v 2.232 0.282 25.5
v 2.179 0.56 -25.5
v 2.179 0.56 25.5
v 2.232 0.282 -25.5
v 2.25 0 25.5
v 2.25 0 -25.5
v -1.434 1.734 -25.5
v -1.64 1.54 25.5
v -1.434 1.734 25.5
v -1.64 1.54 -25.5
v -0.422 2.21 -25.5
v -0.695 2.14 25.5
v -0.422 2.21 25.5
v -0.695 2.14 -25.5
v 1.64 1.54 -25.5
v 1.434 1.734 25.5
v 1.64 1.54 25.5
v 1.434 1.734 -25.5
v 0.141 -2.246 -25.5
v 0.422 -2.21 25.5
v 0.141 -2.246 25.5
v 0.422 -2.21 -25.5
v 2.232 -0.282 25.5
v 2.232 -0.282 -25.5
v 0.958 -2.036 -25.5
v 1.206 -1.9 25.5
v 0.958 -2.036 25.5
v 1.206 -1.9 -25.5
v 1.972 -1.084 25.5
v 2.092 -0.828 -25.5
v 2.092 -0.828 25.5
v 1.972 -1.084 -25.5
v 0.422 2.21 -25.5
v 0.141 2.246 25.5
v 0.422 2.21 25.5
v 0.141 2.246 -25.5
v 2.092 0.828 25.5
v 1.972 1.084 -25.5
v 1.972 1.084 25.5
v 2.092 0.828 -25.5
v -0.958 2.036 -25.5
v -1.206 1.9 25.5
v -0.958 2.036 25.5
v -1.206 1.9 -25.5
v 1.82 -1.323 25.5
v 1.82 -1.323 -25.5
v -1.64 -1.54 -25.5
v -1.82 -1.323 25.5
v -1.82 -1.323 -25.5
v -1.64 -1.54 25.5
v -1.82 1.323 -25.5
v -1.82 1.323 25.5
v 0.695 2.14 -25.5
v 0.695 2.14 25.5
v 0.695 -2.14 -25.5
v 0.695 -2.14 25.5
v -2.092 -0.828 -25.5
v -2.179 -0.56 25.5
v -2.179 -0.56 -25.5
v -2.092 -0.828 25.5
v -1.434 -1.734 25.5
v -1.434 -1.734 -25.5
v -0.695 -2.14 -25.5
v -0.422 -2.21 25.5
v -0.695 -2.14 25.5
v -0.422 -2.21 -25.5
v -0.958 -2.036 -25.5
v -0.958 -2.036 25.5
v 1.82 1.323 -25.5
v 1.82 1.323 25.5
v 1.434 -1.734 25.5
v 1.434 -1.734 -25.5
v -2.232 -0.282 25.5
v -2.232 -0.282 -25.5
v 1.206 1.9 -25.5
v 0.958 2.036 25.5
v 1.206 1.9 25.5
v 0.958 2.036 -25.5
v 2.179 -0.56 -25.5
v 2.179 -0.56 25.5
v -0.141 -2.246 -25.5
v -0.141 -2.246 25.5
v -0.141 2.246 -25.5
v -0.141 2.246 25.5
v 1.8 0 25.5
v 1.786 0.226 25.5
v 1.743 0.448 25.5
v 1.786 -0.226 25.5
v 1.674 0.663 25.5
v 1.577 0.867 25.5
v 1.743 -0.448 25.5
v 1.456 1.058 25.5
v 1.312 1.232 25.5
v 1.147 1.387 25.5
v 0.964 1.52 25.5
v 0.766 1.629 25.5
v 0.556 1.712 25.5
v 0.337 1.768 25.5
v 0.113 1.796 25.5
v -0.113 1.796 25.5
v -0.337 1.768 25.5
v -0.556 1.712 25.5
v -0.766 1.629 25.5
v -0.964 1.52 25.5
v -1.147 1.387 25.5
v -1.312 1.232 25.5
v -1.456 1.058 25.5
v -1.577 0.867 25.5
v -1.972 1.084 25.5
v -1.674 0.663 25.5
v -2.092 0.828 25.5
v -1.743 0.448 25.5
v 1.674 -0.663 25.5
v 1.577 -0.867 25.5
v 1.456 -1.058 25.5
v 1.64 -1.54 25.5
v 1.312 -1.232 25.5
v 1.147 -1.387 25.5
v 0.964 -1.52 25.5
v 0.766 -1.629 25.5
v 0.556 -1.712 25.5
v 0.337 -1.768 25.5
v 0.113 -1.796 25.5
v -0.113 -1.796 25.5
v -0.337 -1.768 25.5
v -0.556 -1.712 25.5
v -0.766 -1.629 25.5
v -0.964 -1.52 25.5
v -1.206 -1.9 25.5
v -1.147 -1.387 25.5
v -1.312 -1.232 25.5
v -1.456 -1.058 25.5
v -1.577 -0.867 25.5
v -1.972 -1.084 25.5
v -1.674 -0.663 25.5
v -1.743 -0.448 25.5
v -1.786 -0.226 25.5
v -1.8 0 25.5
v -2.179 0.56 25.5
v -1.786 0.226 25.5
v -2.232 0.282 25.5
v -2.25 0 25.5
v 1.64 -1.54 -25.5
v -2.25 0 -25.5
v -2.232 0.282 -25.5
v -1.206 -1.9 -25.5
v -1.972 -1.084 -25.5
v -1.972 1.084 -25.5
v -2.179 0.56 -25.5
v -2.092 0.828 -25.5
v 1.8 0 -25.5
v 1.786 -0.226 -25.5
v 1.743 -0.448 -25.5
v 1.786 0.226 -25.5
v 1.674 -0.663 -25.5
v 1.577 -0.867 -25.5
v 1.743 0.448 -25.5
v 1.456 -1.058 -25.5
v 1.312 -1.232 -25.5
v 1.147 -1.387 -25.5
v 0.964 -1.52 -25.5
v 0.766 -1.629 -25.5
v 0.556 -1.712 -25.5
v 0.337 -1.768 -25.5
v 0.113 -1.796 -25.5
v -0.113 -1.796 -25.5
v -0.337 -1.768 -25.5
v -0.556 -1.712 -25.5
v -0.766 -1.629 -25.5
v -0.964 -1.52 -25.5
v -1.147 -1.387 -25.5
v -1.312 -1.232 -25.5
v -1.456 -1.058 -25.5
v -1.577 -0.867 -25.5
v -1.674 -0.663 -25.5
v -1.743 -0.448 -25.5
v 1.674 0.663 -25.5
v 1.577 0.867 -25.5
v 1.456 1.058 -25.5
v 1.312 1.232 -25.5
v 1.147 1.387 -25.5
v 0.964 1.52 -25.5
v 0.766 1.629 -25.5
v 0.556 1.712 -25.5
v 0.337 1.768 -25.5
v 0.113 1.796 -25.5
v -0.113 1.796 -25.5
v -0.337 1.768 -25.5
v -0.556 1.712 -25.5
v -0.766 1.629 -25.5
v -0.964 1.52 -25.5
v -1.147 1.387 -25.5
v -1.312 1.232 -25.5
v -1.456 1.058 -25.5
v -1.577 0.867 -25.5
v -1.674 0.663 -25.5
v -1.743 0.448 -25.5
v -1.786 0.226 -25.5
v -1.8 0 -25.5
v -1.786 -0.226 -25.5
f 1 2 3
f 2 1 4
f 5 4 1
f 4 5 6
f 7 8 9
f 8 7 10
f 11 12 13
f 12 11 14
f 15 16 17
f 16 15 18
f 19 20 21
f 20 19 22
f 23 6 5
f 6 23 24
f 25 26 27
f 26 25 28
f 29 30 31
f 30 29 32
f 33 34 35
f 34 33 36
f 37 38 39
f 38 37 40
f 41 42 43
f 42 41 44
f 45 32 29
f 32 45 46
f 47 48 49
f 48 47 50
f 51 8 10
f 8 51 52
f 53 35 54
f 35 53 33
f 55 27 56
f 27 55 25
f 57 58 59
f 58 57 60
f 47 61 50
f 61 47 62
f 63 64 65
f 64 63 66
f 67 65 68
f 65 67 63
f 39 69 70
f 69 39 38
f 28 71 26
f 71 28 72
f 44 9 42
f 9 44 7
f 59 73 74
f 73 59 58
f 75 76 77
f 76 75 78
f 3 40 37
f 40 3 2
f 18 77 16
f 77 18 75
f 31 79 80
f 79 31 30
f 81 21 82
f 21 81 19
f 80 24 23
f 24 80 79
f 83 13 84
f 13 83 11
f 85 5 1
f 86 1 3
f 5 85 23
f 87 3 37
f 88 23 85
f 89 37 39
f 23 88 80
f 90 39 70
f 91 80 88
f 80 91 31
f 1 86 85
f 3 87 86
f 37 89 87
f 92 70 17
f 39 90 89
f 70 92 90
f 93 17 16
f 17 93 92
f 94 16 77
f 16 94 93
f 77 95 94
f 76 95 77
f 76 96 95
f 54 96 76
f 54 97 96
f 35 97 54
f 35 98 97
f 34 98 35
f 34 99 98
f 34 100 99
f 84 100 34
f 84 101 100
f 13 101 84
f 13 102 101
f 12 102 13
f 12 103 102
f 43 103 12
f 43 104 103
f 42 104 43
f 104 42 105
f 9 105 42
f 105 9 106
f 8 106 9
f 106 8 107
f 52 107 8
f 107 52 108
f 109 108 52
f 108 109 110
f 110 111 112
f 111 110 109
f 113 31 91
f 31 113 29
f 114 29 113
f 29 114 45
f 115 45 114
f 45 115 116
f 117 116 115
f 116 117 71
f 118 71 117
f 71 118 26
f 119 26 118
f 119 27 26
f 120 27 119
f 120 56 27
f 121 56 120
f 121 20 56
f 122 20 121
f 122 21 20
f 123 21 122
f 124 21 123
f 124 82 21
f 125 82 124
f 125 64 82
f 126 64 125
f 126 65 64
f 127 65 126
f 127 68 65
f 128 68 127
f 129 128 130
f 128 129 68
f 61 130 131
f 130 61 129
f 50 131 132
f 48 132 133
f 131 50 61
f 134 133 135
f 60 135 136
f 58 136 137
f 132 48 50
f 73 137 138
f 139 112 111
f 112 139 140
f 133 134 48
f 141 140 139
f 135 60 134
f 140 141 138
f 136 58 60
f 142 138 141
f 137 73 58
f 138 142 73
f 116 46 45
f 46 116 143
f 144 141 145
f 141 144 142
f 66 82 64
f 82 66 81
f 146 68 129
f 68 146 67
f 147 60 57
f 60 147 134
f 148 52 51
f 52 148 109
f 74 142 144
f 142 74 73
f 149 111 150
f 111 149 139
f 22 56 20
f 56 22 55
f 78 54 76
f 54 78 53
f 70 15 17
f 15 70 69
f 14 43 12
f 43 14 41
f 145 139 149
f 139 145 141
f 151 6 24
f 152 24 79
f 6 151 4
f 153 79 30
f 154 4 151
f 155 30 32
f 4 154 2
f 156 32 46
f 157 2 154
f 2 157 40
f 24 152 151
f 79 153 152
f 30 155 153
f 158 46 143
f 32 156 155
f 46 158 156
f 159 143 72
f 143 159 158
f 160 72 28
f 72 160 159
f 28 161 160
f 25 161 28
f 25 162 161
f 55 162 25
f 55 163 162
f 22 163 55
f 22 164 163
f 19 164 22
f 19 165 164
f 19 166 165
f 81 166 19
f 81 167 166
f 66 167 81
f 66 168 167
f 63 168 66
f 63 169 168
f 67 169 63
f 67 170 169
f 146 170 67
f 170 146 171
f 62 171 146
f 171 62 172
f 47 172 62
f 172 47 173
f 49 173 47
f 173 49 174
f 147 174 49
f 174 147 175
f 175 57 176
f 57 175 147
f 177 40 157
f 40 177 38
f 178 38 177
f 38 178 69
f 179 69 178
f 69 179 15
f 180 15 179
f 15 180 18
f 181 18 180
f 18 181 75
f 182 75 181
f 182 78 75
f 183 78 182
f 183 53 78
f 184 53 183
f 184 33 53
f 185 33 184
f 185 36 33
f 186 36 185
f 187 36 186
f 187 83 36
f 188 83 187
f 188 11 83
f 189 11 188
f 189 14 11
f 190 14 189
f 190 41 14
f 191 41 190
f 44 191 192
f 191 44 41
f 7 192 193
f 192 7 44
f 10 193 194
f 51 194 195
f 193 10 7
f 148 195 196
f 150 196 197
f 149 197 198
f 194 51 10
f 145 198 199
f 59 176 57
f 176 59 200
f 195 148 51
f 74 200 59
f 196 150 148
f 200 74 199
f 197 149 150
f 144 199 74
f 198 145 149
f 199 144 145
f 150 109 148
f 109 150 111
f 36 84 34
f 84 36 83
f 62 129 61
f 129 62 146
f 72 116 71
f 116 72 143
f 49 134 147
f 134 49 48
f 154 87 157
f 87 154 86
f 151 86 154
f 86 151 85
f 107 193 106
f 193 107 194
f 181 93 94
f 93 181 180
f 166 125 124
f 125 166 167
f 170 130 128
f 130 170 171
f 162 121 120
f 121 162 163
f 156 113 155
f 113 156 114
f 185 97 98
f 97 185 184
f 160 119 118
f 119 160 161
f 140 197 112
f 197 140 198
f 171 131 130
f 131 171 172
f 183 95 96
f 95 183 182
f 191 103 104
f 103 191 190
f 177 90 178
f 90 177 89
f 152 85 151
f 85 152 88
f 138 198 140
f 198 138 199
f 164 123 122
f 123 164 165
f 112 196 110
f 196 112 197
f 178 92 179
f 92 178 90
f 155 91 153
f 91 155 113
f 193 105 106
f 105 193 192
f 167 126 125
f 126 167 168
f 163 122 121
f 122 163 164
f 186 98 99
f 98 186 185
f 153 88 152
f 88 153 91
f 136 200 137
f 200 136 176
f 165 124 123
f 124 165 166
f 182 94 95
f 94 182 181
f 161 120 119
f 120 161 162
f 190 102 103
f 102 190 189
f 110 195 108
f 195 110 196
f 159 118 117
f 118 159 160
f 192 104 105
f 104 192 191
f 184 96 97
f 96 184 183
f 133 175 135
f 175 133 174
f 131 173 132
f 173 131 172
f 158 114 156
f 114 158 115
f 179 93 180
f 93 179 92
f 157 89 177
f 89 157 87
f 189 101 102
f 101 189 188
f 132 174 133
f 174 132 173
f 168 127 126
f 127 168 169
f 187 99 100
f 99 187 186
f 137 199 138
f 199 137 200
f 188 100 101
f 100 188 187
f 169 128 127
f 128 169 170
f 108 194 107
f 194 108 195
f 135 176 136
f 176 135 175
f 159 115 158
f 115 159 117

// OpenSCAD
$fn = 50;


difference() {
	union() {
		translate(v = [0, 0, -25.5000000000]) {
			cylinder(h = 51, r = 2.2500000000);
		}
	}
	union() {
		#translate(v = [0, 0, -100.0000000000]) {
			cylinder(h = 200, r = 1.8000000000);
		}
	}
}
